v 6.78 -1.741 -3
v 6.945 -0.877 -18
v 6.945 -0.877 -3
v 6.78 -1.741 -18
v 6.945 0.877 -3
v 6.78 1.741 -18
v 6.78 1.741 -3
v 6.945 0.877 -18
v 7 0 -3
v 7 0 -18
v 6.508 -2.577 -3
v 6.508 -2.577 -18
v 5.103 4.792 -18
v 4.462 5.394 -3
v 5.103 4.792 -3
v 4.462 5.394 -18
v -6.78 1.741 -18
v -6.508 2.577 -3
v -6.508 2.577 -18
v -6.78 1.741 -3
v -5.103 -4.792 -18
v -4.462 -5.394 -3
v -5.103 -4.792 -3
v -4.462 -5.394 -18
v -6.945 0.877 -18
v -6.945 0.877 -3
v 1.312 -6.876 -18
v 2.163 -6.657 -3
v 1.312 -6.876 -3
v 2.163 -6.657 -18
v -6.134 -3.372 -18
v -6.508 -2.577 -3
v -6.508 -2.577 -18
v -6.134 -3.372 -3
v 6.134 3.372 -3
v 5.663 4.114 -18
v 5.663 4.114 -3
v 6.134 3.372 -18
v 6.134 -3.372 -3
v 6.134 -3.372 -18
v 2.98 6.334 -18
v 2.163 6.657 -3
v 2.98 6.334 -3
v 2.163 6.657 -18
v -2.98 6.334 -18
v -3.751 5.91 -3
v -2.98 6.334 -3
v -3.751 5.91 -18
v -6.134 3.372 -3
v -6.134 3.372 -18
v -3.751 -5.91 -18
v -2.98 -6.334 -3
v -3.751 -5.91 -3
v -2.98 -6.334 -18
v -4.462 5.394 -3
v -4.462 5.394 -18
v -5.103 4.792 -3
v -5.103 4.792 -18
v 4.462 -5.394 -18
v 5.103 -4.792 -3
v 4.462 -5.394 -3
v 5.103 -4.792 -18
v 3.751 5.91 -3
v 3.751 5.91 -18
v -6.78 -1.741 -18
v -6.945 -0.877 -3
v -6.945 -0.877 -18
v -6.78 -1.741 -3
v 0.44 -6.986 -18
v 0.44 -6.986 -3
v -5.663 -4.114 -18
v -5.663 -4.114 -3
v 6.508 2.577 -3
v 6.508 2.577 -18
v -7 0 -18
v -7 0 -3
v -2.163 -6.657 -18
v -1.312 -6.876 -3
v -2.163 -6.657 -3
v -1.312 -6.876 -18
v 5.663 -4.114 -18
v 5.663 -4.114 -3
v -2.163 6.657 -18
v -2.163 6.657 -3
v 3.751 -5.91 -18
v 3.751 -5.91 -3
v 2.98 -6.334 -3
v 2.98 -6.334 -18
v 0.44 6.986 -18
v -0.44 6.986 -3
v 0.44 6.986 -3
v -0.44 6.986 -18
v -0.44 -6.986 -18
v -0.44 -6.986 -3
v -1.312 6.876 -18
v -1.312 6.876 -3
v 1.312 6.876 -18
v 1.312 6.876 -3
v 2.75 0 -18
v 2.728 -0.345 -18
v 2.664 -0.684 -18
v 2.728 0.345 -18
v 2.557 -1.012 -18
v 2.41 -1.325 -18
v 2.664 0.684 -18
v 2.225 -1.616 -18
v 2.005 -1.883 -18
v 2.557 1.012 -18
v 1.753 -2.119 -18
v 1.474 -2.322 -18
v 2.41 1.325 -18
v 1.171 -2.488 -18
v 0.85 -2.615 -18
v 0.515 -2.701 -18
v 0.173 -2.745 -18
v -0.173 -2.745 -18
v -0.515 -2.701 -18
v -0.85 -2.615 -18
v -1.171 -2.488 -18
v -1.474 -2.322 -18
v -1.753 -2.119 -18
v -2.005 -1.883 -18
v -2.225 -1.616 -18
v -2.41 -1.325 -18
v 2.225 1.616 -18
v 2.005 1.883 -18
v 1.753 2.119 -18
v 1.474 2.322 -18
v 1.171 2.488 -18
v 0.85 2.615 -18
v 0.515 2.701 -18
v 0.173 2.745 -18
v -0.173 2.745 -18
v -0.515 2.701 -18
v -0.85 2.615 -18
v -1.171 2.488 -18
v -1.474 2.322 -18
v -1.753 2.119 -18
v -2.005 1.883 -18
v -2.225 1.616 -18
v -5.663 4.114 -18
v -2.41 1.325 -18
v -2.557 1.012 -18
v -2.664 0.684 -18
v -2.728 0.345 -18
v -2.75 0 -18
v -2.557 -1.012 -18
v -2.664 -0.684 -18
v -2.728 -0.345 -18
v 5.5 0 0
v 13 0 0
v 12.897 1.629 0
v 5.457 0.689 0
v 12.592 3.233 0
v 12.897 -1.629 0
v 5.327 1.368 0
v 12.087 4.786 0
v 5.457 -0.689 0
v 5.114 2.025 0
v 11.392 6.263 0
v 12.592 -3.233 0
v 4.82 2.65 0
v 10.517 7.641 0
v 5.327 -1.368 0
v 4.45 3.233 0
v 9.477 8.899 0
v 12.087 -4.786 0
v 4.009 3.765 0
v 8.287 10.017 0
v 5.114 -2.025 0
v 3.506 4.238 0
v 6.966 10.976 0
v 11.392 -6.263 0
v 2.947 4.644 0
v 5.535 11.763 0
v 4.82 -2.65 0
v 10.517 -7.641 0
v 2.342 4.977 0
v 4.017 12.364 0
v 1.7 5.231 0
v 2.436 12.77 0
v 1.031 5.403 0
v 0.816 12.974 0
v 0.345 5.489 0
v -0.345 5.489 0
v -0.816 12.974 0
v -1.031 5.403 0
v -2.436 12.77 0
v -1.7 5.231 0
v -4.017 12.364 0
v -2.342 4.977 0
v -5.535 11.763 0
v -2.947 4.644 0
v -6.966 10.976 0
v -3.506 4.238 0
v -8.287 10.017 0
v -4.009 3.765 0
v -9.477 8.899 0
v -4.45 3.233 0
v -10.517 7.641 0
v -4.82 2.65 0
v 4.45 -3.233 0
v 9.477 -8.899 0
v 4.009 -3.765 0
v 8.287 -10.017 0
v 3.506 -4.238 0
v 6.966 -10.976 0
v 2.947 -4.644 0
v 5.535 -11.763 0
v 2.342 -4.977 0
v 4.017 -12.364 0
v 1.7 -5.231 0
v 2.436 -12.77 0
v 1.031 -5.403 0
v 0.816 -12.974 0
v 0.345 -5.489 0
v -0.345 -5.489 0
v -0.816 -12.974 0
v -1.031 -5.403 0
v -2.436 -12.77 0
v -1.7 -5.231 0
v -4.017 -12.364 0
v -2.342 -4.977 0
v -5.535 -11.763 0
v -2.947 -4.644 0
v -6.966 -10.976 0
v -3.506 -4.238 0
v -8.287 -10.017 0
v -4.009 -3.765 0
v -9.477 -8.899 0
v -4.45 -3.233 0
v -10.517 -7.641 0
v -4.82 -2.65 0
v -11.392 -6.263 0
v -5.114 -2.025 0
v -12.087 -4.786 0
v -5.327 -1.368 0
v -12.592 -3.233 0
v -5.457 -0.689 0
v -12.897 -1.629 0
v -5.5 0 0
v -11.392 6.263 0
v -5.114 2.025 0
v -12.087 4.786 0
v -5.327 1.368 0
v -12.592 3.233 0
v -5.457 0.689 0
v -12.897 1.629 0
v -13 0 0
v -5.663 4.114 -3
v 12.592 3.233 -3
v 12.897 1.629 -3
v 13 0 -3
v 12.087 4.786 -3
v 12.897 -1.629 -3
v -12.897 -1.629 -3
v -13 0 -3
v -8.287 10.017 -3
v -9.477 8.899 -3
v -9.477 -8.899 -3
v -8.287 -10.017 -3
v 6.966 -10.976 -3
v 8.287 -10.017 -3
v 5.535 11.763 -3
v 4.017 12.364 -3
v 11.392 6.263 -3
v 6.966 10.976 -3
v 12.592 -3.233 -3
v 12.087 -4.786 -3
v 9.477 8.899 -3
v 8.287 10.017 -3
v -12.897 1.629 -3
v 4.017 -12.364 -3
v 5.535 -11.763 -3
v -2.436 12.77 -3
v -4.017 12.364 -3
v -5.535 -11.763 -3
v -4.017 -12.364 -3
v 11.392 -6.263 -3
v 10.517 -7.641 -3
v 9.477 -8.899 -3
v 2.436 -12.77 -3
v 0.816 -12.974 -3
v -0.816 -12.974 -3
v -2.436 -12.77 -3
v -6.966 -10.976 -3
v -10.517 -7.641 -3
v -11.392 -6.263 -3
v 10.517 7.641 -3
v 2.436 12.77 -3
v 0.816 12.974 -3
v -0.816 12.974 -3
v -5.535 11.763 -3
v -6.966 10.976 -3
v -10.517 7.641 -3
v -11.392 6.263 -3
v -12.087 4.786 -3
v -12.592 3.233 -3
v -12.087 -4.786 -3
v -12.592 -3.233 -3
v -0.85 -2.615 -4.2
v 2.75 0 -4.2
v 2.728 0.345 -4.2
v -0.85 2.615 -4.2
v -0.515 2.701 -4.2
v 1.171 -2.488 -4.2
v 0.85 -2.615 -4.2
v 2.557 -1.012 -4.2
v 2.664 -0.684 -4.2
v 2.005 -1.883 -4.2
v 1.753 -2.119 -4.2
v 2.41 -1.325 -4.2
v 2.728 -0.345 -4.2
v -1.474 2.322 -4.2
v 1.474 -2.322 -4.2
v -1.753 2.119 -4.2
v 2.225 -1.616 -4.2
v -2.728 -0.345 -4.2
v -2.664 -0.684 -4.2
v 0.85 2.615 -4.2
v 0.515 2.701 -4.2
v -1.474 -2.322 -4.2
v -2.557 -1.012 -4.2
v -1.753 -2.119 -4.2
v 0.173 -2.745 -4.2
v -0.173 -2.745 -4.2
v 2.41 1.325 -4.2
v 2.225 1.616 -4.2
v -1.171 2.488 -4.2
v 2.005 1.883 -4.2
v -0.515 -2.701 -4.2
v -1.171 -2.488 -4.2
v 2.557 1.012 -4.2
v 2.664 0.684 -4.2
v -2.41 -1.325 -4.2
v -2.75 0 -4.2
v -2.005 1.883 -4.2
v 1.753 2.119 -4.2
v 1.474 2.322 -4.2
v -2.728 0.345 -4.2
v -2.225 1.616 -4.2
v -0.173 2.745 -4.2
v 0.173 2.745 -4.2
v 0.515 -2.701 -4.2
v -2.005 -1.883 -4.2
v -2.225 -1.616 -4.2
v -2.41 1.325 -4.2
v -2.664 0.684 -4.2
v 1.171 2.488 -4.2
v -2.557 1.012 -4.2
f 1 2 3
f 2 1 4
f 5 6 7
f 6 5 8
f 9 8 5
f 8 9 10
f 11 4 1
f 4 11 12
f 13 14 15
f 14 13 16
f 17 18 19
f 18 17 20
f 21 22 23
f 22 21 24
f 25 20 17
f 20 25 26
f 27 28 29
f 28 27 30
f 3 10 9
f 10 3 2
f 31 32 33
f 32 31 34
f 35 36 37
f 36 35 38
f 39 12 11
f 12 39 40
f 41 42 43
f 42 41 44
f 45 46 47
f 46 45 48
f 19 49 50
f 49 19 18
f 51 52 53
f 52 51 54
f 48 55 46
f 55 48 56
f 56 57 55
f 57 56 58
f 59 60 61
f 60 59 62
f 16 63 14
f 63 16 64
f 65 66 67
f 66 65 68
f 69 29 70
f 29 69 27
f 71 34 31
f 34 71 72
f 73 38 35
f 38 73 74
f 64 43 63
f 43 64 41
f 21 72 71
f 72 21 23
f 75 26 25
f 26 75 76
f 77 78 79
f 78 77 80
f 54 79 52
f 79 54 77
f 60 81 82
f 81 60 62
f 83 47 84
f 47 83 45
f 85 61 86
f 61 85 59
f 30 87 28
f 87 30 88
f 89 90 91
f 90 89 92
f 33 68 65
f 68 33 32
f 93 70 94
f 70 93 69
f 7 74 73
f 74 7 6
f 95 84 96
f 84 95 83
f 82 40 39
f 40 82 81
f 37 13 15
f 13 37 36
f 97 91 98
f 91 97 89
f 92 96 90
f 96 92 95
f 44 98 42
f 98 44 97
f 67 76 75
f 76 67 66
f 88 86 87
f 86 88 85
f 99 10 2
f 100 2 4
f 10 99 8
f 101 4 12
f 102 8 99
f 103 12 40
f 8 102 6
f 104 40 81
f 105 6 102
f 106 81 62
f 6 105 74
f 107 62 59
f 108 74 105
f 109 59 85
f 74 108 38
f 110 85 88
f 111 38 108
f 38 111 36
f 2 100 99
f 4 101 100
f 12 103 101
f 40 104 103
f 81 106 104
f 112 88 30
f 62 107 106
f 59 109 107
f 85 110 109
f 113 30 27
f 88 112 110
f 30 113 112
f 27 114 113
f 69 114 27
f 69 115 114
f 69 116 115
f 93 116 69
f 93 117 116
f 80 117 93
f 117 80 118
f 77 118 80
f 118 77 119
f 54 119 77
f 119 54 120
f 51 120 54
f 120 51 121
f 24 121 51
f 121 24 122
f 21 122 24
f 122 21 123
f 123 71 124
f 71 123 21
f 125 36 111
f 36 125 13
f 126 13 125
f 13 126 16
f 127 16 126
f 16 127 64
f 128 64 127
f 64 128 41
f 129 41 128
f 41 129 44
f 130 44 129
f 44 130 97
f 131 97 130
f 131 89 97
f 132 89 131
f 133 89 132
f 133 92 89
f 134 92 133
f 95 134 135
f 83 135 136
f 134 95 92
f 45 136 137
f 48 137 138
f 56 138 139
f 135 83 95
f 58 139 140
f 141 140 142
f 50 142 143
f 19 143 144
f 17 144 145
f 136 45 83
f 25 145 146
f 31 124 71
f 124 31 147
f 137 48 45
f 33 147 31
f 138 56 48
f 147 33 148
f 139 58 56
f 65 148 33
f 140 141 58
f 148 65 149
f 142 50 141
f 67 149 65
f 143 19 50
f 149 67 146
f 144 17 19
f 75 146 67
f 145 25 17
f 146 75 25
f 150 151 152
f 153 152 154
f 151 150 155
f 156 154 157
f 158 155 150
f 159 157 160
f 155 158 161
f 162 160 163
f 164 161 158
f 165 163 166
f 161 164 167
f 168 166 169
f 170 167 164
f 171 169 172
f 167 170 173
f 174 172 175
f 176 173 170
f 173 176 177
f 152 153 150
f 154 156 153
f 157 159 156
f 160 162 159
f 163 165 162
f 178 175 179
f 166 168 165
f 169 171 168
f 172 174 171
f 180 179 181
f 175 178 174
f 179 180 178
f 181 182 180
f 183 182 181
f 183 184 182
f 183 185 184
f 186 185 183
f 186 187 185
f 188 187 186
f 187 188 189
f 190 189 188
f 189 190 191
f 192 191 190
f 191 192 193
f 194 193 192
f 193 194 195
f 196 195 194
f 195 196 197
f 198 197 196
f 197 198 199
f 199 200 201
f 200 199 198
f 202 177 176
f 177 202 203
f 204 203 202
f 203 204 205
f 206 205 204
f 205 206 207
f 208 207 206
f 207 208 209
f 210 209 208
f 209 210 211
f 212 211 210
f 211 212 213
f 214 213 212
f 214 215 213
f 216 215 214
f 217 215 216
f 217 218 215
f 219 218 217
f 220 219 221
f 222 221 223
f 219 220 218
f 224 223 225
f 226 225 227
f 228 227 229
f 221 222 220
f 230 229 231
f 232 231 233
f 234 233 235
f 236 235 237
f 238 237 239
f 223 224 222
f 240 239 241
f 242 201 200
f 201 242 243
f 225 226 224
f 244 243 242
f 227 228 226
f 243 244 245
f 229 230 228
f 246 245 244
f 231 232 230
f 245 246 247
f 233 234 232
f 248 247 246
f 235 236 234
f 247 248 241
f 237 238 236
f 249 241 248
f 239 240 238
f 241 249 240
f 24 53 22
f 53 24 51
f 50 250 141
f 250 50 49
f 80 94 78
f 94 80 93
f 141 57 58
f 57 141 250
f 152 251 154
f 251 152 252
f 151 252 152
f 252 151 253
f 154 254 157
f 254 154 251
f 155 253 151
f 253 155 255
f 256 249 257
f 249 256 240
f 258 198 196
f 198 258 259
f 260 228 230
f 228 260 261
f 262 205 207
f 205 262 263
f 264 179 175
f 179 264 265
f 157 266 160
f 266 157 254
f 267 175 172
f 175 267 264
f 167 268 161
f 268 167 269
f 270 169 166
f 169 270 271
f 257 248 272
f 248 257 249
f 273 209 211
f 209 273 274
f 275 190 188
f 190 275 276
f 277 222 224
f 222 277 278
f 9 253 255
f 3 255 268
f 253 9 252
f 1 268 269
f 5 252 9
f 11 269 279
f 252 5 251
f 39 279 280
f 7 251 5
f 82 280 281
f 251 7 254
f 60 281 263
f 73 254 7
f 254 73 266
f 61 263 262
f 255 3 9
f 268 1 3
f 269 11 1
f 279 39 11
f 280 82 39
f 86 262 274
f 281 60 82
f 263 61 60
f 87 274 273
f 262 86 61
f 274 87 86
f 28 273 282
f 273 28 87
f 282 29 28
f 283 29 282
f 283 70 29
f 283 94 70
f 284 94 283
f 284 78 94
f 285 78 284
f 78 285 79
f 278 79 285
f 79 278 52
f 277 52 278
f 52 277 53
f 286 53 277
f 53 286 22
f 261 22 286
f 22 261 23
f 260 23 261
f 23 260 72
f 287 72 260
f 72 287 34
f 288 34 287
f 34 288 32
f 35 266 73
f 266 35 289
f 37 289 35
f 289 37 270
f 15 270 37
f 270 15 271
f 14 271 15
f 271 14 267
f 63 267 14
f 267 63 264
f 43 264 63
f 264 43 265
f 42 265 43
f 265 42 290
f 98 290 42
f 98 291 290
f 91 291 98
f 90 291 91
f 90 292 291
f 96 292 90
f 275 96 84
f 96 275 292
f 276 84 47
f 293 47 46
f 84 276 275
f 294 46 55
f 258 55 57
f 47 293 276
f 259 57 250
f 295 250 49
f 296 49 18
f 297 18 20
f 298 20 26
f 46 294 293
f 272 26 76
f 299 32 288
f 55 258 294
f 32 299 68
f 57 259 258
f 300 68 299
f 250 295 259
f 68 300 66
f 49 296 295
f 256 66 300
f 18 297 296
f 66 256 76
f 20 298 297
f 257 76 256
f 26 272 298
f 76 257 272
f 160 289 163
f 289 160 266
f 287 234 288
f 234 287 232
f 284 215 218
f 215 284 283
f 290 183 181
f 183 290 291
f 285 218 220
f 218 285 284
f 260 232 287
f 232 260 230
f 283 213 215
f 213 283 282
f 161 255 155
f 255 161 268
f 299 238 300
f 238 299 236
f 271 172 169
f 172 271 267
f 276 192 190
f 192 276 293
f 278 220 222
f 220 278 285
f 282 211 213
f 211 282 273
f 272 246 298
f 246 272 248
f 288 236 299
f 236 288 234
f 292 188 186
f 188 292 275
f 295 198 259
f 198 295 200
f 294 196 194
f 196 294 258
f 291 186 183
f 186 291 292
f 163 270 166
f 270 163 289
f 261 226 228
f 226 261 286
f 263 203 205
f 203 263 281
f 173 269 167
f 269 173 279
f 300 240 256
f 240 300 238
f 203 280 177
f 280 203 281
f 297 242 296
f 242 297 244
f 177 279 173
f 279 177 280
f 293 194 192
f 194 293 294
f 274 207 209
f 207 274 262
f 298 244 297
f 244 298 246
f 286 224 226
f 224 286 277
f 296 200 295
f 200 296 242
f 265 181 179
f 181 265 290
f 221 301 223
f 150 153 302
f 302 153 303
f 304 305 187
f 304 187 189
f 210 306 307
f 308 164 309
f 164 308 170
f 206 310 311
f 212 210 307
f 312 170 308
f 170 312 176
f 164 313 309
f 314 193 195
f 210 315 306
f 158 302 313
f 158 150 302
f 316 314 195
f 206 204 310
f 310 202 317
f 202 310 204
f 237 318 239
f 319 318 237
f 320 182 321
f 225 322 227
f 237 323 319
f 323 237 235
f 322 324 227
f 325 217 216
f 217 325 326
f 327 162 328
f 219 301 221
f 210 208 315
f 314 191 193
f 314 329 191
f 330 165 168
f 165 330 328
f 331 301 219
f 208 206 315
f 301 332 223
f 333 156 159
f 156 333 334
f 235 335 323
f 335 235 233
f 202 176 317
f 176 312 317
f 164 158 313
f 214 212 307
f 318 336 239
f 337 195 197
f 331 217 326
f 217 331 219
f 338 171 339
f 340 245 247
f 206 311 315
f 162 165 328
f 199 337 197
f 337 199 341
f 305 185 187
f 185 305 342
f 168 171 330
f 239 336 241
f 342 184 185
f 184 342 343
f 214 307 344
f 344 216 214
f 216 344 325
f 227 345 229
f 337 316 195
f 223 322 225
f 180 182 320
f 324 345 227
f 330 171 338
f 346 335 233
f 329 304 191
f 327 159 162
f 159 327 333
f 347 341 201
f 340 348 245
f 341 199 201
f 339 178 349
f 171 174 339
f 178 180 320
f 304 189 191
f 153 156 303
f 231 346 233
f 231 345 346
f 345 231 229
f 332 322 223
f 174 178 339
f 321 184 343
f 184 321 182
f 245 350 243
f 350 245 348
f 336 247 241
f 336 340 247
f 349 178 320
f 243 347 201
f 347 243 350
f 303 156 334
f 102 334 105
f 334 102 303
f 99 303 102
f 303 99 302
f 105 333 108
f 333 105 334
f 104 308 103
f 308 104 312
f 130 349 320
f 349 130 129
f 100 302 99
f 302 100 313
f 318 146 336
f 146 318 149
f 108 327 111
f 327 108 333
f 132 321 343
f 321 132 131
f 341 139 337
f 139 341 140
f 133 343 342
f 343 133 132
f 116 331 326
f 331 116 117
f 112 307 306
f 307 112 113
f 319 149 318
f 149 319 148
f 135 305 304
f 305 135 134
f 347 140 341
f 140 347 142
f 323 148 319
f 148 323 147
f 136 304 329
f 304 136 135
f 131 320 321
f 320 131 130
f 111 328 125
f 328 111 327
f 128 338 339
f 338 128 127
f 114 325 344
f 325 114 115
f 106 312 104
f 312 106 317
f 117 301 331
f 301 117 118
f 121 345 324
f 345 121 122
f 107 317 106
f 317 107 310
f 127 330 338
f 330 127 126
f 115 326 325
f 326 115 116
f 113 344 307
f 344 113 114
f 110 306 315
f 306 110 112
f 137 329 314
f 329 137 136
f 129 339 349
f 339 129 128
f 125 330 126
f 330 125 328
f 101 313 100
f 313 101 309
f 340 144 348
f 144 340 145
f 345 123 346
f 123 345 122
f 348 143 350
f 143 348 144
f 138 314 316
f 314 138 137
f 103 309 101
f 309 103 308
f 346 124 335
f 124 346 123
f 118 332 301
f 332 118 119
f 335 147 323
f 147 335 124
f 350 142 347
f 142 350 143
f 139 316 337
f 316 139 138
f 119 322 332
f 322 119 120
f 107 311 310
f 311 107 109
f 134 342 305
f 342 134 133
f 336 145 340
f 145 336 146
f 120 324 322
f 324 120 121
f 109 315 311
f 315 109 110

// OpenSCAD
$fn = 50;


difference() {
	union() {
		translate(v = [0, 0, -18.0000000000]) {
			cylinder(h = 18, r = 7.0000000000);
		}
		translate(v = [0, 0, -3.0000000000]) {
			cylinder(h = 3, r = 13.0000000000);
		}
	}
	union() {
		translate(v = [0, 0, 0]) {
			rotate(a = [0, 0, 0]) {
				difference() {
					union() {
						#translate(v = [0, 0, -18.0000000000]) {
							cylinder(h = 18, r = 2.2500000000);
						}
						#translate(v = [0, 0, -4.2000000000]) {
							cylinder(h = 4.2000000000, r1 = 2.7500000000, r2 = 5.5000000000);
						}
						#translate(v = [0, 0, -18.0000000000]) {
							cylinder(h = 18, r = 2.7500000000);
						}
						#translate(v = [0, 0, -18.0000000000]) {
							cylinder(h = 18, r = 2.2500000000);
						}
					}
					union();
				}
			}
		}
	}
}
